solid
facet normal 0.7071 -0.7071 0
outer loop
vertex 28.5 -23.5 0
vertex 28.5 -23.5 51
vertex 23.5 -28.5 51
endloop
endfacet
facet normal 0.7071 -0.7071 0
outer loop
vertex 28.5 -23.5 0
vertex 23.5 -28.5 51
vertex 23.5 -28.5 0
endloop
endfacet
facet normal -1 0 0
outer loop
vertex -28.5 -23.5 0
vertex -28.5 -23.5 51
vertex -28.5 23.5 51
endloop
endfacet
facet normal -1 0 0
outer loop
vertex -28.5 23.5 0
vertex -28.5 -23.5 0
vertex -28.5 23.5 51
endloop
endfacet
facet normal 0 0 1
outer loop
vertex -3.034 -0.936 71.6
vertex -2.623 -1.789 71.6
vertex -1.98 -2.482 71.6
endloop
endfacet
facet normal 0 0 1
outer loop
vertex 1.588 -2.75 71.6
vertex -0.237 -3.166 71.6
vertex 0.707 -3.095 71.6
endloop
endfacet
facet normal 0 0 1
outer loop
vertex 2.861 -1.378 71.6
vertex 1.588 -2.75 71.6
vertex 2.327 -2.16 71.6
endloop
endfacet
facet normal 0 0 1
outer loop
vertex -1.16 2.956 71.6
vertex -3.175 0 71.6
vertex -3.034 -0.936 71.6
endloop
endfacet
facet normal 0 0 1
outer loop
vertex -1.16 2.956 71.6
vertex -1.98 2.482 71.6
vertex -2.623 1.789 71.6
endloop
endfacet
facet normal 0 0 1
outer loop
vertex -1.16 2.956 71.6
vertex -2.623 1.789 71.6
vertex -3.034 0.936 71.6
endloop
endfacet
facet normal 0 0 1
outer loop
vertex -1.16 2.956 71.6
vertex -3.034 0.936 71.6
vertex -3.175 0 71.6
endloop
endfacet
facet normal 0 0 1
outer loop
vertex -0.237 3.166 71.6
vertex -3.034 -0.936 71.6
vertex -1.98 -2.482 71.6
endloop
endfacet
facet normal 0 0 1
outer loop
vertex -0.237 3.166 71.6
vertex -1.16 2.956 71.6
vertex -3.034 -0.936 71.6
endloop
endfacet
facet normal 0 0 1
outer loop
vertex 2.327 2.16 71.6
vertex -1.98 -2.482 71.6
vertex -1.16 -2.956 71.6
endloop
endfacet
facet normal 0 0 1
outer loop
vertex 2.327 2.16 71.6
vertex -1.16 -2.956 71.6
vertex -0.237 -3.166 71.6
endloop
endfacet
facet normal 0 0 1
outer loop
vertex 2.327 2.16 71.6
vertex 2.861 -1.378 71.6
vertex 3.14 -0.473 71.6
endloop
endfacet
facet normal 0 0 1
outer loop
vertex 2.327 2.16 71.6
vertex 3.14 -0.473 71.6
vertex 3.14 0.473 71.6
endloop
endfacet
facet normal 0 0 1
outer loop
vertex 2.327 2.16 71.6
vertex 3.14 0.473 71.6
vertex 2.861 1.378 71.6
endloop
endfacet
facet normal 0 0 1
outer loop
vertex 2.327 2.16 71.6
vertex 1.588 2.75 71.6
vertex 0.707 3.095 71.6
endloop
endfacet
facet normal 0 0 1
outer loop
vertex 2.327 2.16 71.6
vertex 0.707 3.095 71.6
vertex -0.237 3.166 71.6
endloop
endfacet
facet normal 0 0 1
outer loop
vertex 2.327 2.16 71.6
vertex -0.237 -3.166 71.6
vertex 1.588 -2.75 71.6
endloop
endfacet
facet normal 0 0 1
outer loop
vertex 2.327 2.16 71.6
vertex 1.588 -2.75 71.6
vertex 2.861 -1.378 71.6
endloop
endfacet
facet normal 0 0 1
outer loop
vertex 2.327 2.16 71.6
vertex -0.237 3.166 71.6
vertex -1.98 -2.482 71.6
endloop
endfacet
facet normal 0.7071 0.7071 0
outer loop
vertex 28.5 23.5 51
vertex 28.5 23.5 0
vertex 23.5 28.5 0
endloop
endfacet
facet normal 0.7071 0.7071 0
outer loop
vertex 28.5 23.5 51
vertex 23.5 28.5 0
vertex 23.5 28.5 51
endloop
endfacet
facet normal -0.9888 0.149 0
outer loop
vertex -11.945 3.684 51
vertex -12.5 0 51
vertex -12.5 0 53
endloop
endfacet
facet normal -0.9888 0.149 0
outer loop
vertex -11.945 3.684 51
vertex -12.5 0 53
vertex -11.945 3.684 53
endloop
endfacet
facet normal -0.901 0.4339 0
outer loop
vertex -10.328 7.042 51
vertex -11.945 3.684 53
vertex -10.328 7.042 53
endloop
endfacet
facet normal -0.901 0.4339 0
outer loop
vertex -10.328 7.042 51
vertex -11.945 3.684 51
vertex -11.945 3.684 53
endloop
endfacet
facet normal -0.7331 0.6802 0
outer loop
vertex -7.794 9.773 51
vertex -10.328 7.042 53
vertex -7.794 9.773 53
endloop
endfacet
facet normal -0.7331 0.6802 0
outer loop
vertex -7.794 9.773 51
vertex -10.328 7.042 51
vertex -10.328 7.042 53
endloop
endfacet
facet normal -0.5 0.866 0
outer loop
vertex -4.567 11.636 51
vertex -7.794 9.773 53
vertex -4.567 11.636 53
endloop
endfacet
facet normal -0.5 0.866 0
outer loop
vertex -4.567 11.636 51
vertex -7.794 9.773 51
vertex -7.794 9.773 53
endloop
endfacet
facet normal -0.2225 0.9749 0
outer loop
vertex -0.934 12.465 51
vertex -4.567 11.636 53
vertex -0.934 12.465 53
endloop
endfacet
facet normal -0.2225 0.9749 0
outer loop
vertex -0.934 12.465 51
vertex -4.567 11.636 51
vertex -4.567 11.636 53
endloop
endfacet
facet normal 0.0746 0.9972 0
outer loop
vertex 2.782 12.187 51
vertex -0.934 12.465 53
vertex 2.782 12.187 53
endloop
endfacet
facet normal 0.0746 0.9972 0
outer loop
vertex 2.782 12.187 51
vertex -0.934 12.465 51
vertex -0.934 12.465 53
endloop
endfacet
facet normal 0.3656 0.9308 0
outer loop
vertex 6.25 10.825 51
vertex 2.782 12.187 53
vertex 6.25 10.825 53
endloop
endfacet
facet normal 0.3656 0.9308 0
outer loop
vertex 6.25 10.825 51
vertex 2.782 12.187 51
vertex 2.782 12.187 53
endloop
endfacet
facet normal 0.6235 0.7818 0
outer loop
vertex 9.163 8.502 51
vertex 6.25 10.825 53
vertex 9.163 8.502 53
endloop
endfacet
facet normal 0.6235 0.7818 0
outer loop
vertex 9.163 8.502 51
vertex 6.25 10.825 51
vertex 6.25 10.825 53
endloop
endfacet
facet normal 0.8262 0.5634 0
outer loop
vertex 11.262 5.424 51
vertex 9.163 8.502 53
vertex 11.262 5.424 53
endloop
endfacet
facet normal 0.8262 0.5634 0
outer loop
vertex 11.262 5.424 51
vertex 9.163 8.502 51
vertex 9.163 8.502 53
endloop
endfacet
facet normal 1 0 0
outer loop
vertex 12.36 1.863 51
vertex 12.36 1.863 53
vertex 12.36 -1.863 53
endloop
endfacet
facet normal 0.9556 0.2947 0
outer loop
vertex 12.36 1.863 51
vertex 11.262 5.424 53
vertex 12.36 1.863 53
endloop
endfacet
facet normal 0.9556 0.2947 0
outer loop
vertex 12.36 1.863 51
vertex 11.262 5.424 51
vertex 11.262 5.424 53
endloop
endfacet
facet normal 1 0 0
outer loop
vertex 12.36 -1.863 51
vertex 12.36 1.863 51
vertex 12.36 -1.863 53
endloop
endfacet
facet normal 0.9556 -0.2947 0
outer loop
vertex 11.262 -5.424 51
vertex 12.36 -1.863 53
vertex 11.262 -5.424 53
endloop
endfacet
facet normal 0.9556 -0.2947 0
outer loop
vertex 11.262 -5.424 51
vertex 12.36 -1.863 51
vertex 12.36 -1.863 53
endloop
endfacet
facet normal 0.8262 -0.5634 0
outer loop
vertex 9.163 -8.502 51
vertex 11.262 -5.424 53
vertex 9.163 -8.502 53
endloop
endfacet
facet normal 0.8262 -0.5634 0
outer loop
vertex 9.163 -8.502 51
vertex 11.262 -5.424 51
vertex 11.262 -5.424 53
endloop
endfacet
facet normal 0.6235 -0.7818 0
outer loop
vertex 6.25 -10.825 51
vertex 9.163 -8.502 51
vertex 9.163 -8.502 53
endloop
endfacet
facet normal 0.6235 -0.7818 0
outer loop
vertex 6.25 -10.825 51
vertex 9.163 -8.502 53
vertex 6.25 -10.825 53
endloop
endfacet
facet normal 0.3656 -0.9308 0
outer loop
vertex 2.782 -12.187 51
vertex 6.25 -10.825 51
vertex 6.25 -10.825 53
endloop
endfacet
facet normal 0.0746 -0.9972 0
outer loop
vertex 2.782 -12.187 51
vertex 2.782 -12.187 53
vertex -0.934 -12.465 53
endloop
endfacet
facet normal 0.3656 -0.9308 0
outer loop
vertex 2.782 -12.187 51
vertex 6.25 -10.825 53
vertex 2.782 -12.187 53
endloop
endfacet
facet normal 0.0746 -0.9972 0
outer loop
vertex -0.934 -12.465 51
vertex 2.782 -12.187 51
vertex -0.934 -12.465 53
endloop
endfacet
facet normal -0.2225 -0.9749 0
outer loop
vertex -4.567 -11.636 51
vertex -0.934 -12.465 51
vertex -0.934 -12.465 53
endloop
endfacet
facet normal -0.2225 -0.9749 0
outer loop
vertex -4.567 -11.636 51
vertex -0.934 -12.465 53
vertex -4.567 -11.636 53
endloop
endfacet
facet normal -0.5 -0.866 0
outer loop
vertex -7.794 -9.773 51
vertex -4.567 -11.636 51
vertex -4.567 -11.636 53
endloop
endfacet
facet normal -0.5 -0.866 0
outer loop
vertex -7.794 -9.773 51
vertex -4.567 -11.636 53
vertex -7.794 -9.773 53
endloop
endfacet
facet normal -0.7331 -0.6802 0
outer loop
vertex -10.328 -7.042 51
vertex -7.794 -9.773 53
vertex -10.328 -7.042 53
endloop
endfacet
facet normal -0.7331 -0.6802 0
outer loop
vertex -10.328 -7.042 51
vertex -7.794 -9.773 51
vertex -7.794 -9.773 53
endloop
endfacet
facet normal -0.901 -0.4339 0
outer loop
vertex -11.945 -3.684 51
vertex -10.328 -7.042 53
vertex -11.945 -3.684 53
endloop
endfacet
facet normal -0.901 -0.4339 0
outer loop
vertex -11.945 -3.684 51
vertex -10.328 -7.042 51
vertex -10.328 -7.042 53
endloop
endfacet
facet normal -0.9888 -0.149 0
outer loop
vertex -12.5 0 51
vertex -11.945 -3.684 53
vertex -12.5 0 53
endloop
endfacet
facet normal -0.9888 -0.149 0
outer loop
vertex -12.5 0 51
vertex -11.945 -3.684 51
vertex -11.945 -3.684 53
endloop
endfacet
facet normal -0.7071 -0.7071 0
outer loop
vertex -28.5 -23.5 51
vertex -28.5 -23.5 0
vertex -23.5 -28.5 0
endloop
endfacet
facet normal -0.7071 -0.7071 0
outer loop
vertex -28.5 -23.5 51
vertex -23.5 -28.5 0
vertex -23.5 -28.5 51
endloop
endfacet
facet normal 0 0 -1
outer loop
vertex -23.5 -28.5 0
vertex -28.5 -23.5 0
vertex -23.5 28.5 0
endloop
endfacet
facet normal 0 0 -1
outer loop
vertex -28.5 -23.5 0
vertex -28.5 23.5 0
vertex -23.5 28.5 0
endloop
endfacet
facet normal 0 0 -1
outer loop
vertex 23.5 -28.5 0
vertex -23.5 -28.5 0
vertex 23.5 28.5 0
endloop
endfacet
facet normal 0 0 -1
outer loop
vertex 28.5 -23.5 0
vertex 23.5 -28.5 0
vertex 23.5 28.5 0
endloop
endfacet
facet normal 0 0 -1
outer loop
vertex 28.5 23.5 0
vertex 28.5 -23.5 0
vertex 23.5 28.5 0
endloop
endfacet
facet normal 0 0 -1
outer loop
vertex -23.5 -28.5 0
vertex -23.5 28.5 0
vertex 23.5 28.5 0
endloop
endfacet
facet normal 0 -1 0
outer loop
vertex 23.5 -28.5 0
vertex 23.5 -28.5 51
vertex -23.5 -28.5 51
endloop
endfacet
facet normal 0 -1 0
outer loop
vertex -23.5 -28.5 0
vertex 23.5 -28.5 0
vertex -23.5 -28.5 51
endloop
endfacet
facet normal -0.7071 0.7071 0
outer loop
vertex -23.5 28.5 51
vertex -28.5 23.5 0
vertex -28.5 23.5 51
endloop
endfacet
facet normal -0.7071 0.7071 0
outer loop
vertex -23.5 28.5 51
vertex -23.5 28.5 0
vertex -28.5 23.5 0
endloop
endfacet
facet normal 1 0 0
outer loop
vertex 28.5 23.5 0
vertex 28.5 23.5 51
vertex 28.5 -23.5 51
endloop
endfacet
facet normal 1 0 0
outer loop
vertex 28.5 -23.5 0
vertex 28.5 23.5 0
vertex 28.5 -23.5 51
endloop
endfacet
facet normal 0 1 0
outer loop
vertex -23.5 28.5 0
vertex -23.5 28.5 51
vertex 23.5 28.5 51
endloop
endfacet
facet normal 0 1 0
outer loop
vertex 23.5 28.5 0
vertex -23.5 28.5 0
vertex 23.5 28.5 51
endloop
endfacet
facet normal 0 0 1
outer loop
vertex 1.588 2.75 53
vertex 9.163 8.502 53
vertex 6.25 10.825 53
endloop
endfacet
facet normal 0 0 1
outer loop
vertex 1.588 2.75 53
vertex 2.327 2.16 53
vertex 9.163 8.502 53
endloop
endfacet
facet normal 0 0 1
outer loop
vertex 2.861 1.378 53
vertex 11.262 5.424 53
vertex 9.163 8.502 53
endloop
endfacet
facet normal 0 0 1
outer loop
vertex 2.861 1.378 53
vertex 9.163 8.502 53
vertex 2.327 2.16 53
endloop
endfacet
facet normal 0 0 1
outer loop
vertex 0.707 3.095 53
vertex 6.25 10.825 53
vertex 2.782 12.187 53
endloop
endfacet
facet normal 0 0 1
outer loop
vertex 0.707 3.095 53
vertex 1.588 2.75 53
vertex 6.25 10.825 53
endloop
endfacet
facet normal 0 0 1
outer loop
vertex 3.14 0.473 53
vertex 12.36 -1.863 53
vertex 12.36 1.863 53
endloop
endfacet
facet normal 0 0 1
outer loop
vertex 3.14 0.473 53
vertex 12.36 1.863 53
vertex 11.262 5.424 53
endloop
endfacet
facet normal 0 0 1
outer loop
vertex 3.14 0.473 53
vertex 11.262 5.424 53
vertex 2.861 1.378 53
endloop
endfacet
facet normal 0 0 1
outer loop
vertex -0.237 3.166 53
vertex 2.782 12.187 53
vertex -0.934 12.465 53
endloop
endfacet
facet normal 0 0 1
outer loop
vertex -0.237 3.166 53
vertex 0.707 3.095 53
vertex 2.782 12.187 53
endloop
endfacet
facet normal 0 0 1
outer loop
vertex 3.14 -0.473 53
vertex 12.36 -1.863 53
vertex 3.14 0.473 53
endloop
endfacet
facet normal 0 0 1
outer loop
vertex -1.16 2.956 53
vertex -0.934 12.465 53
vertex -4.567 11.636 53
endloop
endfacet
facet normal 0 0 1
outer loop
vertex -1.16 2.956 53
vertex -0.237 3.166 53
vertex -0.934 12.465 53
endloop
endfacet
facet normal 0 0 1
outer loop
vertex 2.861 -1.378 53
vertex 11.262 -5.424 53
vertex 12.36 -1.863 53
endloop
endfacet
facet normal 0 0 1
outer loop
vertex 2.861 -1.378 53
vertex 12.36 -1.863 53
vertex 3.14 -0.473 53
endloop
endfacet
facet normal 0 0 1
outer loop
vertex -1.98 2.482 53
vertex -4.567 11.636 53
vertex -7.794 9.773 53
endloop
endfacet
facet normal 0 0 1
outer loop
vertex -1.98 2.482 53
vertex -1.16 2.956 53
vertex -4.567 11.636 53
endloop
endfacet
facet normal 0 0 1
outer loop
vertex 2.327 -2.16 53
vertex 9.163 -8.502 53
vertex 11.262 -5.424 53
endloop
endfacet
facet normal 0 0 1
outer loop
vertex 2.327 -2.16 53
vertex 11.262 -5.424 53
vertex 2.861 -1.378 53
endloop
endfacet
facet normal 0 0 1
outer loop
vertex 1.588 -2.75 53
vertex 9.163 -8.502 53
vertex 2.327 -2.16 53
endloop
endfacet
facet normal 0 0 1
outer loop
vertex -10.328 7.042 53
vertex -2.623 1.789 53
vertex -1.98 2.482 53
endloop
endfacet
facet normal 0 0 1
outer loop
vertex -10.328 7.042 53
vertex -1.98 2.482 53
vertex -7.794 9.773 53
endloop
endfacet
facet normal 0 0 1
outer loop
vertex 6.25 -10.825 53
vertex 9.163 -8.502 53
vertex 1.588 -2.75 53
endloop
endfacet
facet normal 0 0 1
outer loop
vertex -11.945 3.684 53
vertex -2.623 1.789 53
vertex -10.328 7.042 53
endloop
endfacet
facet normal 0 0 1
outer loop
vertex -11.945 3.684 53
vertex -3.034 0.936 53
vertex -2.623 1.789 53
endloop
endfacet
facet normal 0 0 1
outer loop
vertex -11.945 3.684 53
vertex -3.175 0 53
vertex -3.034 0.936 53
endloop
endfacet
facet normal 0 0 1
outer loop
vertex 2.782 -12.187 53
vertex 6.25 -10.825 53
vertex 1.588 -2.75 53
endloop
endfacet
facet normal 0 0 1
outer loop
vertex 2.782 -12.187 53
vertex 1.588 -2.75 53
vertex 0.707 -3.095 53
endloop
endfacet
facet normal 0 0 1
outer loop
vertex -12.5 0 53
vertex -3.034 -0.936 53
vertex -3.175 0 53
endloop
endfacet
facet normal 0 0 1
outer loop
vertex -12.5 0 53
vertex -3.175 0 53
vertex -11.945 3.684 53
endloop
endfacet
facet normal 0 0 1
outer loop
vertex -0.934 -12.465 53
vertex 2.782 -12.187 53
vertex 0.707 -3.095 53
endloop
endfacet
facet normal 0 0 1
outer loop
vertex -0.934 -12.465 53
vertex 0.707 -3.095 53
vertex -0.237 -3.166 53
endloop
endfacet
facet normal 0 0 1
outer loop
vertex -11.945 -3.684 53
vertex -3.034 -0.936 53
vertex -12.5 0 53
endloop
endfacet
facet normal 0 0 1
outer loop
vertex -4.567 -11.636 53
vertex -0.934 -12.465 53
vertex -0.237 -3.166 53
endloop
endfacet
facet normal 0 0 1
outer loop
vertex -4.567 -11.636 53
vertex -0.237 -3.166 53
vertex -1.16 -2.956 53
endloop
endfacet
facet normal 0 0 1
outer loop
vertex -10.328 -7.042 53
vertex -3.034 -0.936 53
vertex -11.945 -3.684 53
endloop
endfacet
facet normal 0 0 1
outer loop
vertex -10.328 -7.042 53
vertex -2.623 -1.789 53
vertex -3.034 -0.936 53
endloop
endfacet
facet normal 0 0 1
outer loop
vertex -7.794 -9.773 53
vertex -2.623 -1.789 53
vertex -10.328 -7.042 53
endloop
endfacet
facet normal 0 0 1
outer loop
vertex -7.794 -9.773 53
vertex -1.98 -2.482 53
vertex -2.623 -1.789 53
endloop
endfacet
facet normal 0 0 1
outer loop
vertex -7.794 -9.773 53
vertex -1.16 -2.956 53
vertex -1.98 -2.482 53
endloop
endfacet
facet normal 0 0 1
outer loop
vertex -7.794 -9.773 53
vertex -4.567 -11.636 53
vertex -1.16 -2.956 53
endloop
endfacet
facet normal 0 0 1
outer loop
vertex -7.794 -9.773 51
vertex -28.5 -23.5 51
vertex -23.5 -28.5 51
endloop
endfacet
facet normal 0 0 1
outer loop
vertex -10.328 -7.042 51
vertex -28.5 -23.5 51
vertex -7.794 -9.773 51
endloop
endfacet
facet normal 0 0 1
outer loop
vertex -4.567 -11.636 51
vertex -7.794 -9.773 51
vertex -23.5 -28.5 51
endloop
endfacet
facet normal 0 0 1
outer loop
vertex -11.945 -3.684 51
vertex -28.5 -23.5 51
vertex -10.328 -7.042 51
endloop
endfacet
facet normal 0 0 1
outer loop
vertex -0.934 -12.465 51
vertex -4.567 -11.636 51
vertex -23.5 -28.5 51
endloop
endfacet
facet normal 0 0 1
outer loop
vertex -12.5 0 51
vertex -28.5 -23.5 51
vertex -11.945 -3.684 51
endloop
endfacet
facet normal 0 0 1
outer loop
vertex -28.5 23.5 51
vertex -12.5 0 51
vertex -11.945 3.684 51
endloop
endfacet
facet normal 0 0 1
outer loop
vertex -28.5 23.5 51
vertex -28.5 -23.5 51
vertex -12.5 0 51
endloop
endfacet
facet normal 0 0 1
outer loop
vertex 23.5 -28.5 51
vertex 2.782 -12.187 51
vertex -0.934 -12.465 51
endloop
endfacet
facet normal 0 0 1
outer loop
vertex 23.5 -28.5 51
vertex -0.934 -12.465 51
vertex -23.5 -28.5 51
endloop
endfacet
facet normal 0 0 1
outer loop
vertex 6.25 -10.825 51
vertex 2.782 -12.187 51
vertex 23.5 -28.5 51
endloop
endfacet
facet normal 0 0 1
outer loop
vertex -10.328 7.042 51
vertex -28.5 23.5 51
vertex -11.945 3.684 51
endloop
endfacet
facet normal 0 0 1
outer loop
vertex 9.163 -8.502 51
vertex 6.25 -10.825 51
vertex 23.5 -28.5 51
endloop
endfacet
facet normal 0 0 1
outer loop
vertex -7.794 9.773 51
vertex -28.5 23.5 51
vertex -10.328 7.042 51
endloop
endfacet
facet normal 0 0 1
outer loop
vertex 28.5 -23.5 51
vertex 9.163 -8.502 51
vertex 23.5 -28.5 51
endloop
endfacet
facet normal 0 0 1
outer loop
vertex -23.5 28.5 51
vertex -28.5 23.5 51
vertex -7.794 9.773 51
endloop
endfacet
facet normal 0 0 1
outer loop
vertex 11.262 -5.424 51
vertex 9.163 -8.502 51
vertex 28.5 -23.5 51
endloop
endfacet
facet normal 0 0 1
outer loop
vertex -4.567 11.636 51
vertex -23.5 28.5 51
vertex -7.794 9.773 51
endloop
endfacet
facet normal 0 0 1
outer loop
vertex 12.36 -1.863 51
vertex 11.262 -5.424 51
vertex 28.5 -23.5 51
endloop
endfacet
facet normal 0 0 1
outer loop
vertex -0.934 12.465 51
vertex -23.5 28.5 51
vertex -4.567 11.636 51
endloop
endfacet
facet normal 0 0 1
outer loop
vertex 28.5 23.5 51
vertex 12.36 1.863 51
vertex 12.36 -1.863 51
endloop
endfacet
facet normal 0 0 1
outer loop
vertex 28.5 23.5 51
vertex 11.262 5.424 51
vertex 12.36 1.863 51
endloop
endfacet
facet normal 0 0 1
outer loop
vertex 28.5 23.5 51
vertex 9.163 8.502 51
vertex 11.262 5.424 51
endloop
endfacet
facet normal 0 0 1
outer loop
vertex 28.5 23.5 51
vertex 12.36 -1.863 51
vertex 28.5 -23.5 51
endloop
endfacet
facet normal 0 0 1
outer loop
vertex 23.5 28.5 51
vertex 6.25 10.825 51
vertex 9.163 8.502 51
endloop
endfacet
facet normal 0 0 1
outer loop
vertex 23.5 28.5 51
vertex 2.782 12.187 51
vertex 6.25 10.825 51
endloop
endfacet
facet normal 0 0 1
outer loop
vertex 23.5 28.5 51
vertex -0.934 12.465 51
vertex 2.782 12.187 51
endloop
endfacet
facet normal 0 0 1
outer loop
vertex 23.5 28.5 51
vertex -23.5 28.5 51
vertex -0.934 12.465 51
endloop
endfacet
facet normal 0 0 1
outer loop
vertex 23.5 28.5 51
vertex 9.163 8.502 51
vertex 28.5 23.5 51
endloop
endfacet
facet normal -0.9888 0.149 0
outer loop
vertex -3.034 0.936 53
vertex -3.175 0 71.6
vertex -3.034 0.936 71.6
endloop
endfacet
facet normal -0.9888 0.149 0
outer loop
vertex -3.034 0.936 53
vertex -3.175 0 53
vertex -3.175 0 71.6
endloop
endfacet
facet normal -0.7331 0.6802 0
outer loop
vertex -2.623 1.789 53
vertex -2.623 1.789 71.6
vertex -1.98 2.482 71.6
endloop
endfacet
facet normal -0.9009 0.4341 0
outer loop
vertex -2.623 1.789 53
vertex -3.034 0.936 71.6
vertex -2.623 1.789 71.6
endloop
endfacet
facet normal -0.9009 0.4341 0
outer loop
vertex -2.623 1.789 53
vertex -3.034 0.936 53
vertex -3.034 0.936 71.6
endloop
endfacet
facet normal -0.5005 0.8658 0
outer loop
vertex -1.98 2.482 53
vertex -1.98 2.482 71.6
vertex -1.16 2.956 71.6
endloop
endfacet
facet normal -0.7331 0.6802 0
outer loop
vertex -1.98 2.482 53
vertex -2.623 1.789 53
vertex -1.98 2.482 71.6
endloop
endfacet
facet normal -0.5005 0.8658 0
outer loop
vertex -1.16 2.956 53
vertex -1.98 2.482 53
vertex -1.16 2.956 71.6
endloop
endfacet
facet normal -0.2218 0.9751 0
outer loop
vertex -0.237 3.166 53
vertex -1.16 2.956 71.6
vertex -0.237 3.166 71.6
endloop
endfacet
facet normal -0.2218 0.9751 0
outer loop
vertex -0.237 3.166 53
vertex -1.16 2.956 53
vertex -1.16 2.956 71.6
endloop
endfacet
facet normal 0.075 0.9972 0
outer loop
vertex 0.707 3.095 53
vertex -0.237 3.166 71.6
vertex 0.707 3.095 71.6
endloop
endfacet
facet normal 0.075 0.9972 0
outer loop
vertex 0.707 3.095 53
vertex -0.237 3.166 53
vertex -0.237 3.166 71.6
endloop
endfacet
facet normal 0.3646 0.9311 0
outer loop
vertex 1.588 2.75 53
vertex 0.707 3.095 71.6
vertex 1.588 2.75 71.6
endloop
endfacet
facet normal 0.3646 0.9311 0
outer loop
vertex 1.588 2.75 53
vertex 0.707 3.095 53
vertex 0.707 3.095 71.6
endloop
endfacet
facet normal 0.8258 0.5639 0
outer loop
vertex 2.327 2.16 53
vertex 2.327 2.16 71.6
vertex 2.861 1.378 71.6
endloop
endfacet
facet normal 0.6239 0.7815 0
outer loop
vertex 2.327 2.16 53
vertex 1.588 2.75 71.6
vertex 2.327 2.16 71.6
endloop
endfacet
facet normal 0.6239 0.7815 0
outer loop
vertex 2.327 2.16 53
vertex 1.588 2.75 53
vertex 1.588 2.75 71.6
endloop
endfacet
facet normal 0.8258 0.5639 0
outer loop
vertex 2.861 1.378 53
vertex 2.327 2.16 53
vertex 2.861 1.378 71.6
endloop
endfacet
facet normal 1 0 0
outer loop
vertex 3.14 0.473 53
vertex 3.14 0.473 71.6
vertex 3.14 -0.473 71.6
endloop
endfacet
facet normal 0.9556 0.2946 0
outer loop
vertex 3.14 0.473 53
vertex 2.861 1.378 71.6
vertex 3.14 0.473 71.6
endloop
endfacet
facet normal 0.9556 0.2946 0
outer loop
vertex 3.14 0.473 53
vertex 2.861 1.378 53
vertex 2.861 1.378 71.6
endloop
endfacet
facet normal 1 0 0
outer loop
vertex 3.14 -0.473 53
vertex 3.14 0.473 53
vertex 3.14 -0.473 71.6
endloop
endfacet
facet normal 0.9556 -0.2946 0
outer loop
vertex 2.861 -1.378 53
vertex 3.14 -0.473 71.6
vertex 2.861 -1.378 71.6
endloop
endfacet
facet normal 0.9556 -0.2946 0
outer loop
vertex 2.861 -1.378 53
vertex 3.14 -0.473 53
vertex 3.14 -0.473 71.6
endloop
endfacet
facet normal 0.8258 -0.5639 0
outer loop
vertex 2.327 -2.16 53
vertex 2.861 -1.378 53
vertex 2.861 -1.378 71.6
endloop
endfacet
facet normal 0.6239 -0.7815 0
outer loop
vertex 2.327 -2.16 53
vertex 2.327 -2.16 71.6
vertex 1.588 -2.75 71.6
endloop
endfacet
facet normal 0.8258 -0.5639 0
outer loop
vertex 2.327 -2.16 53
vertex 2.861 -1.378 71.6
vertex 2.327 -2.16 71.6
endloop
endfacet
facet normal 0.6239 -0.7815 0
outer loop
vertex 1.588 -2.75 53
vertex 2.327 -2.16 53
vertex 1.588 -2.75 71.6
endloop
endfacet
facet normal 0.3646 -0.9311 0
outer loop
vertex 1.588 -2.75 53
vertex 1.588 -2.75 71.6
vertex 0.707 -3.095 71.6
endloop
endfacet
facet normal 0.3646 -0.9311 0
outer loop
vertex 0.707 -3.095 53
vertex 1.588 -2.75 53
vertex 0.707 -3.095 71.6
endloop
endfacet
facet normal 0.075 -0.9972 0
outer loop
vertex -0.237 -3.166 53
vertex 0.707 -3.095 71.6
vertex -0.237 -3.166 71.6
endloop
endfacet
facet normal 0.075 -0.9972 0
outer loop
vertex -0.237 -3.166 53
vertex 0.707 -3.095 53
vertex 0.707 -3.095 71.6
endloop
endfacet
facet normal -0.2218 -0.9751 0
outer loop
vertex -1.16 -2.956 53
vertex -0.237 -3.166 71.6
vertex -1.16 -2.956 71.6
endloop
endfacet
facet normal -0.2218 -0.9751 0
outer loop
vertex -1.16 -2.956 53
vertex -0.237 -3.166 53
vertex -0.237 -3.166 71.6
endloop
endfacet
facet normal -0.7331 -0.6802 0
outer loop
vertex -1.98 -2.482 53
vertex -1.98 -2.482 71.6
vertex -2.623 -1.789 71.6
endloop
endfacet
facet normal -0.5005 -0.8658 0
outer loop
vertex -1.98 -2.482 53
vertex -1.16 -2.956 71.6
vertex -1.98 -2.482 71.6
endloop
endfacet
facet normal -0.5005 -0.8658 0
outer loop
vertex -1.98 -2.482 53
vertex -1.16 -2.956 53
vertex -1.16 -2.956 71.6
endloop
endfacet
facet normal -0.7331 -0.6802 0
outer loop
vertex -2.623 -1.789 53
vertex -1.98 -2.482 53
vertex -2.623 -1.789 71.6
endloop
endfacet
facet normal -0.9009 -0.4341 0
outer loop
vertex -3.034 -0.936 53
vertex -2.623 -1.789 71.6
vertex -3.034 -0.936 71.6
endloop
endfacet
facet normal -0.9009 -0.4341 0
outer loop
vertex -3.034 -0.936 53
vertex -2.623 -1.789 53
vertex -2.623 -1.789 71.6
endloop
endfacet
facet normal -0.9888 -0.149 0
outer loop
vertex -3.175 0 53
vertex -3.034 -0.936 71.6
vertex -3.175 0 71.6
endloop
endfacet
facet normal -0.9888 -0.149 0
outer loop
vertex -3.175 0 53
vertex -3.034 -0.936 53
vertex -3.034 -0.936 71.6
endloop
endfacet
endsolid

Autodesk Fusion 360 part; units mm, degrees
sketch "Sketch1" plane through (0, 0, 0) normal (0, 0, 1) x (1, 0, 0)
  line L0 (28.5, -28.5) -> (-28.5, -28.5)
  line L1 (-28.5, -28.5) -> (-28.5, 28.5)
  line L2 (-28.5, 28.5) -> (28.5, 28.5)
  line L3 (28.5, 28.5) -> (28.5, -28.5)
  line L4 (28.5, -28.5) -> (-28.5, 28.5) construction
  line L5 (-28.5, -28.5) -> (28.5, 28.5) construction
  dimension "d1" = 57
  dimension "d2" = 57
extrude "Extrude1" add sketch "Sketch1" along normal blind 51
chamfer "Chamfer1" distance 5 angle 45 4 edges at (-28.5, -28.5, 25.5) (28.5, -28.5, 25.5) (-28.5, 28.5, 25.5) (28.5, 28.5, 25.5)
sketch "Sketch2" plane through (0, 0, 51) normal (0, 0, 1) x (-1, 0, 0)
  line L0 (-28.5, -23.5) -> (-23.5, -28.5)
  line L1 (-23.5, -28.5) -> (23.5, -28.5)
  line L2 (23.5, -28.5) -> (28.5, -23.5)
  line L3 (28.5, -23.5) -> (28.5, 23.5)
  line L4 (28.5, 23.5) -> (23.5, 28.5)
  line L5 (23.5, 28.5) -> (-23.5, 28.5)
  line L6 (-23.5, 28.5) -> (-28.5, 23.5)
  line L7 (-28.5, 23.5) -> (-28.5, -23.5)
  circle A0 centre (0, 0) radius 12.5
  circle A1 centre (0, 0) radius 3.175
  dimension "d6" = 25
  dimension "d7" = 6.35
extrude "Extrude2" add sketch "Sketch2" along normal blind 2 contours A0
extrude "Extrude3" add 1 faces at (1.0904, 0.6963, 51) along direction (0, 0, 1) blind 20.6
